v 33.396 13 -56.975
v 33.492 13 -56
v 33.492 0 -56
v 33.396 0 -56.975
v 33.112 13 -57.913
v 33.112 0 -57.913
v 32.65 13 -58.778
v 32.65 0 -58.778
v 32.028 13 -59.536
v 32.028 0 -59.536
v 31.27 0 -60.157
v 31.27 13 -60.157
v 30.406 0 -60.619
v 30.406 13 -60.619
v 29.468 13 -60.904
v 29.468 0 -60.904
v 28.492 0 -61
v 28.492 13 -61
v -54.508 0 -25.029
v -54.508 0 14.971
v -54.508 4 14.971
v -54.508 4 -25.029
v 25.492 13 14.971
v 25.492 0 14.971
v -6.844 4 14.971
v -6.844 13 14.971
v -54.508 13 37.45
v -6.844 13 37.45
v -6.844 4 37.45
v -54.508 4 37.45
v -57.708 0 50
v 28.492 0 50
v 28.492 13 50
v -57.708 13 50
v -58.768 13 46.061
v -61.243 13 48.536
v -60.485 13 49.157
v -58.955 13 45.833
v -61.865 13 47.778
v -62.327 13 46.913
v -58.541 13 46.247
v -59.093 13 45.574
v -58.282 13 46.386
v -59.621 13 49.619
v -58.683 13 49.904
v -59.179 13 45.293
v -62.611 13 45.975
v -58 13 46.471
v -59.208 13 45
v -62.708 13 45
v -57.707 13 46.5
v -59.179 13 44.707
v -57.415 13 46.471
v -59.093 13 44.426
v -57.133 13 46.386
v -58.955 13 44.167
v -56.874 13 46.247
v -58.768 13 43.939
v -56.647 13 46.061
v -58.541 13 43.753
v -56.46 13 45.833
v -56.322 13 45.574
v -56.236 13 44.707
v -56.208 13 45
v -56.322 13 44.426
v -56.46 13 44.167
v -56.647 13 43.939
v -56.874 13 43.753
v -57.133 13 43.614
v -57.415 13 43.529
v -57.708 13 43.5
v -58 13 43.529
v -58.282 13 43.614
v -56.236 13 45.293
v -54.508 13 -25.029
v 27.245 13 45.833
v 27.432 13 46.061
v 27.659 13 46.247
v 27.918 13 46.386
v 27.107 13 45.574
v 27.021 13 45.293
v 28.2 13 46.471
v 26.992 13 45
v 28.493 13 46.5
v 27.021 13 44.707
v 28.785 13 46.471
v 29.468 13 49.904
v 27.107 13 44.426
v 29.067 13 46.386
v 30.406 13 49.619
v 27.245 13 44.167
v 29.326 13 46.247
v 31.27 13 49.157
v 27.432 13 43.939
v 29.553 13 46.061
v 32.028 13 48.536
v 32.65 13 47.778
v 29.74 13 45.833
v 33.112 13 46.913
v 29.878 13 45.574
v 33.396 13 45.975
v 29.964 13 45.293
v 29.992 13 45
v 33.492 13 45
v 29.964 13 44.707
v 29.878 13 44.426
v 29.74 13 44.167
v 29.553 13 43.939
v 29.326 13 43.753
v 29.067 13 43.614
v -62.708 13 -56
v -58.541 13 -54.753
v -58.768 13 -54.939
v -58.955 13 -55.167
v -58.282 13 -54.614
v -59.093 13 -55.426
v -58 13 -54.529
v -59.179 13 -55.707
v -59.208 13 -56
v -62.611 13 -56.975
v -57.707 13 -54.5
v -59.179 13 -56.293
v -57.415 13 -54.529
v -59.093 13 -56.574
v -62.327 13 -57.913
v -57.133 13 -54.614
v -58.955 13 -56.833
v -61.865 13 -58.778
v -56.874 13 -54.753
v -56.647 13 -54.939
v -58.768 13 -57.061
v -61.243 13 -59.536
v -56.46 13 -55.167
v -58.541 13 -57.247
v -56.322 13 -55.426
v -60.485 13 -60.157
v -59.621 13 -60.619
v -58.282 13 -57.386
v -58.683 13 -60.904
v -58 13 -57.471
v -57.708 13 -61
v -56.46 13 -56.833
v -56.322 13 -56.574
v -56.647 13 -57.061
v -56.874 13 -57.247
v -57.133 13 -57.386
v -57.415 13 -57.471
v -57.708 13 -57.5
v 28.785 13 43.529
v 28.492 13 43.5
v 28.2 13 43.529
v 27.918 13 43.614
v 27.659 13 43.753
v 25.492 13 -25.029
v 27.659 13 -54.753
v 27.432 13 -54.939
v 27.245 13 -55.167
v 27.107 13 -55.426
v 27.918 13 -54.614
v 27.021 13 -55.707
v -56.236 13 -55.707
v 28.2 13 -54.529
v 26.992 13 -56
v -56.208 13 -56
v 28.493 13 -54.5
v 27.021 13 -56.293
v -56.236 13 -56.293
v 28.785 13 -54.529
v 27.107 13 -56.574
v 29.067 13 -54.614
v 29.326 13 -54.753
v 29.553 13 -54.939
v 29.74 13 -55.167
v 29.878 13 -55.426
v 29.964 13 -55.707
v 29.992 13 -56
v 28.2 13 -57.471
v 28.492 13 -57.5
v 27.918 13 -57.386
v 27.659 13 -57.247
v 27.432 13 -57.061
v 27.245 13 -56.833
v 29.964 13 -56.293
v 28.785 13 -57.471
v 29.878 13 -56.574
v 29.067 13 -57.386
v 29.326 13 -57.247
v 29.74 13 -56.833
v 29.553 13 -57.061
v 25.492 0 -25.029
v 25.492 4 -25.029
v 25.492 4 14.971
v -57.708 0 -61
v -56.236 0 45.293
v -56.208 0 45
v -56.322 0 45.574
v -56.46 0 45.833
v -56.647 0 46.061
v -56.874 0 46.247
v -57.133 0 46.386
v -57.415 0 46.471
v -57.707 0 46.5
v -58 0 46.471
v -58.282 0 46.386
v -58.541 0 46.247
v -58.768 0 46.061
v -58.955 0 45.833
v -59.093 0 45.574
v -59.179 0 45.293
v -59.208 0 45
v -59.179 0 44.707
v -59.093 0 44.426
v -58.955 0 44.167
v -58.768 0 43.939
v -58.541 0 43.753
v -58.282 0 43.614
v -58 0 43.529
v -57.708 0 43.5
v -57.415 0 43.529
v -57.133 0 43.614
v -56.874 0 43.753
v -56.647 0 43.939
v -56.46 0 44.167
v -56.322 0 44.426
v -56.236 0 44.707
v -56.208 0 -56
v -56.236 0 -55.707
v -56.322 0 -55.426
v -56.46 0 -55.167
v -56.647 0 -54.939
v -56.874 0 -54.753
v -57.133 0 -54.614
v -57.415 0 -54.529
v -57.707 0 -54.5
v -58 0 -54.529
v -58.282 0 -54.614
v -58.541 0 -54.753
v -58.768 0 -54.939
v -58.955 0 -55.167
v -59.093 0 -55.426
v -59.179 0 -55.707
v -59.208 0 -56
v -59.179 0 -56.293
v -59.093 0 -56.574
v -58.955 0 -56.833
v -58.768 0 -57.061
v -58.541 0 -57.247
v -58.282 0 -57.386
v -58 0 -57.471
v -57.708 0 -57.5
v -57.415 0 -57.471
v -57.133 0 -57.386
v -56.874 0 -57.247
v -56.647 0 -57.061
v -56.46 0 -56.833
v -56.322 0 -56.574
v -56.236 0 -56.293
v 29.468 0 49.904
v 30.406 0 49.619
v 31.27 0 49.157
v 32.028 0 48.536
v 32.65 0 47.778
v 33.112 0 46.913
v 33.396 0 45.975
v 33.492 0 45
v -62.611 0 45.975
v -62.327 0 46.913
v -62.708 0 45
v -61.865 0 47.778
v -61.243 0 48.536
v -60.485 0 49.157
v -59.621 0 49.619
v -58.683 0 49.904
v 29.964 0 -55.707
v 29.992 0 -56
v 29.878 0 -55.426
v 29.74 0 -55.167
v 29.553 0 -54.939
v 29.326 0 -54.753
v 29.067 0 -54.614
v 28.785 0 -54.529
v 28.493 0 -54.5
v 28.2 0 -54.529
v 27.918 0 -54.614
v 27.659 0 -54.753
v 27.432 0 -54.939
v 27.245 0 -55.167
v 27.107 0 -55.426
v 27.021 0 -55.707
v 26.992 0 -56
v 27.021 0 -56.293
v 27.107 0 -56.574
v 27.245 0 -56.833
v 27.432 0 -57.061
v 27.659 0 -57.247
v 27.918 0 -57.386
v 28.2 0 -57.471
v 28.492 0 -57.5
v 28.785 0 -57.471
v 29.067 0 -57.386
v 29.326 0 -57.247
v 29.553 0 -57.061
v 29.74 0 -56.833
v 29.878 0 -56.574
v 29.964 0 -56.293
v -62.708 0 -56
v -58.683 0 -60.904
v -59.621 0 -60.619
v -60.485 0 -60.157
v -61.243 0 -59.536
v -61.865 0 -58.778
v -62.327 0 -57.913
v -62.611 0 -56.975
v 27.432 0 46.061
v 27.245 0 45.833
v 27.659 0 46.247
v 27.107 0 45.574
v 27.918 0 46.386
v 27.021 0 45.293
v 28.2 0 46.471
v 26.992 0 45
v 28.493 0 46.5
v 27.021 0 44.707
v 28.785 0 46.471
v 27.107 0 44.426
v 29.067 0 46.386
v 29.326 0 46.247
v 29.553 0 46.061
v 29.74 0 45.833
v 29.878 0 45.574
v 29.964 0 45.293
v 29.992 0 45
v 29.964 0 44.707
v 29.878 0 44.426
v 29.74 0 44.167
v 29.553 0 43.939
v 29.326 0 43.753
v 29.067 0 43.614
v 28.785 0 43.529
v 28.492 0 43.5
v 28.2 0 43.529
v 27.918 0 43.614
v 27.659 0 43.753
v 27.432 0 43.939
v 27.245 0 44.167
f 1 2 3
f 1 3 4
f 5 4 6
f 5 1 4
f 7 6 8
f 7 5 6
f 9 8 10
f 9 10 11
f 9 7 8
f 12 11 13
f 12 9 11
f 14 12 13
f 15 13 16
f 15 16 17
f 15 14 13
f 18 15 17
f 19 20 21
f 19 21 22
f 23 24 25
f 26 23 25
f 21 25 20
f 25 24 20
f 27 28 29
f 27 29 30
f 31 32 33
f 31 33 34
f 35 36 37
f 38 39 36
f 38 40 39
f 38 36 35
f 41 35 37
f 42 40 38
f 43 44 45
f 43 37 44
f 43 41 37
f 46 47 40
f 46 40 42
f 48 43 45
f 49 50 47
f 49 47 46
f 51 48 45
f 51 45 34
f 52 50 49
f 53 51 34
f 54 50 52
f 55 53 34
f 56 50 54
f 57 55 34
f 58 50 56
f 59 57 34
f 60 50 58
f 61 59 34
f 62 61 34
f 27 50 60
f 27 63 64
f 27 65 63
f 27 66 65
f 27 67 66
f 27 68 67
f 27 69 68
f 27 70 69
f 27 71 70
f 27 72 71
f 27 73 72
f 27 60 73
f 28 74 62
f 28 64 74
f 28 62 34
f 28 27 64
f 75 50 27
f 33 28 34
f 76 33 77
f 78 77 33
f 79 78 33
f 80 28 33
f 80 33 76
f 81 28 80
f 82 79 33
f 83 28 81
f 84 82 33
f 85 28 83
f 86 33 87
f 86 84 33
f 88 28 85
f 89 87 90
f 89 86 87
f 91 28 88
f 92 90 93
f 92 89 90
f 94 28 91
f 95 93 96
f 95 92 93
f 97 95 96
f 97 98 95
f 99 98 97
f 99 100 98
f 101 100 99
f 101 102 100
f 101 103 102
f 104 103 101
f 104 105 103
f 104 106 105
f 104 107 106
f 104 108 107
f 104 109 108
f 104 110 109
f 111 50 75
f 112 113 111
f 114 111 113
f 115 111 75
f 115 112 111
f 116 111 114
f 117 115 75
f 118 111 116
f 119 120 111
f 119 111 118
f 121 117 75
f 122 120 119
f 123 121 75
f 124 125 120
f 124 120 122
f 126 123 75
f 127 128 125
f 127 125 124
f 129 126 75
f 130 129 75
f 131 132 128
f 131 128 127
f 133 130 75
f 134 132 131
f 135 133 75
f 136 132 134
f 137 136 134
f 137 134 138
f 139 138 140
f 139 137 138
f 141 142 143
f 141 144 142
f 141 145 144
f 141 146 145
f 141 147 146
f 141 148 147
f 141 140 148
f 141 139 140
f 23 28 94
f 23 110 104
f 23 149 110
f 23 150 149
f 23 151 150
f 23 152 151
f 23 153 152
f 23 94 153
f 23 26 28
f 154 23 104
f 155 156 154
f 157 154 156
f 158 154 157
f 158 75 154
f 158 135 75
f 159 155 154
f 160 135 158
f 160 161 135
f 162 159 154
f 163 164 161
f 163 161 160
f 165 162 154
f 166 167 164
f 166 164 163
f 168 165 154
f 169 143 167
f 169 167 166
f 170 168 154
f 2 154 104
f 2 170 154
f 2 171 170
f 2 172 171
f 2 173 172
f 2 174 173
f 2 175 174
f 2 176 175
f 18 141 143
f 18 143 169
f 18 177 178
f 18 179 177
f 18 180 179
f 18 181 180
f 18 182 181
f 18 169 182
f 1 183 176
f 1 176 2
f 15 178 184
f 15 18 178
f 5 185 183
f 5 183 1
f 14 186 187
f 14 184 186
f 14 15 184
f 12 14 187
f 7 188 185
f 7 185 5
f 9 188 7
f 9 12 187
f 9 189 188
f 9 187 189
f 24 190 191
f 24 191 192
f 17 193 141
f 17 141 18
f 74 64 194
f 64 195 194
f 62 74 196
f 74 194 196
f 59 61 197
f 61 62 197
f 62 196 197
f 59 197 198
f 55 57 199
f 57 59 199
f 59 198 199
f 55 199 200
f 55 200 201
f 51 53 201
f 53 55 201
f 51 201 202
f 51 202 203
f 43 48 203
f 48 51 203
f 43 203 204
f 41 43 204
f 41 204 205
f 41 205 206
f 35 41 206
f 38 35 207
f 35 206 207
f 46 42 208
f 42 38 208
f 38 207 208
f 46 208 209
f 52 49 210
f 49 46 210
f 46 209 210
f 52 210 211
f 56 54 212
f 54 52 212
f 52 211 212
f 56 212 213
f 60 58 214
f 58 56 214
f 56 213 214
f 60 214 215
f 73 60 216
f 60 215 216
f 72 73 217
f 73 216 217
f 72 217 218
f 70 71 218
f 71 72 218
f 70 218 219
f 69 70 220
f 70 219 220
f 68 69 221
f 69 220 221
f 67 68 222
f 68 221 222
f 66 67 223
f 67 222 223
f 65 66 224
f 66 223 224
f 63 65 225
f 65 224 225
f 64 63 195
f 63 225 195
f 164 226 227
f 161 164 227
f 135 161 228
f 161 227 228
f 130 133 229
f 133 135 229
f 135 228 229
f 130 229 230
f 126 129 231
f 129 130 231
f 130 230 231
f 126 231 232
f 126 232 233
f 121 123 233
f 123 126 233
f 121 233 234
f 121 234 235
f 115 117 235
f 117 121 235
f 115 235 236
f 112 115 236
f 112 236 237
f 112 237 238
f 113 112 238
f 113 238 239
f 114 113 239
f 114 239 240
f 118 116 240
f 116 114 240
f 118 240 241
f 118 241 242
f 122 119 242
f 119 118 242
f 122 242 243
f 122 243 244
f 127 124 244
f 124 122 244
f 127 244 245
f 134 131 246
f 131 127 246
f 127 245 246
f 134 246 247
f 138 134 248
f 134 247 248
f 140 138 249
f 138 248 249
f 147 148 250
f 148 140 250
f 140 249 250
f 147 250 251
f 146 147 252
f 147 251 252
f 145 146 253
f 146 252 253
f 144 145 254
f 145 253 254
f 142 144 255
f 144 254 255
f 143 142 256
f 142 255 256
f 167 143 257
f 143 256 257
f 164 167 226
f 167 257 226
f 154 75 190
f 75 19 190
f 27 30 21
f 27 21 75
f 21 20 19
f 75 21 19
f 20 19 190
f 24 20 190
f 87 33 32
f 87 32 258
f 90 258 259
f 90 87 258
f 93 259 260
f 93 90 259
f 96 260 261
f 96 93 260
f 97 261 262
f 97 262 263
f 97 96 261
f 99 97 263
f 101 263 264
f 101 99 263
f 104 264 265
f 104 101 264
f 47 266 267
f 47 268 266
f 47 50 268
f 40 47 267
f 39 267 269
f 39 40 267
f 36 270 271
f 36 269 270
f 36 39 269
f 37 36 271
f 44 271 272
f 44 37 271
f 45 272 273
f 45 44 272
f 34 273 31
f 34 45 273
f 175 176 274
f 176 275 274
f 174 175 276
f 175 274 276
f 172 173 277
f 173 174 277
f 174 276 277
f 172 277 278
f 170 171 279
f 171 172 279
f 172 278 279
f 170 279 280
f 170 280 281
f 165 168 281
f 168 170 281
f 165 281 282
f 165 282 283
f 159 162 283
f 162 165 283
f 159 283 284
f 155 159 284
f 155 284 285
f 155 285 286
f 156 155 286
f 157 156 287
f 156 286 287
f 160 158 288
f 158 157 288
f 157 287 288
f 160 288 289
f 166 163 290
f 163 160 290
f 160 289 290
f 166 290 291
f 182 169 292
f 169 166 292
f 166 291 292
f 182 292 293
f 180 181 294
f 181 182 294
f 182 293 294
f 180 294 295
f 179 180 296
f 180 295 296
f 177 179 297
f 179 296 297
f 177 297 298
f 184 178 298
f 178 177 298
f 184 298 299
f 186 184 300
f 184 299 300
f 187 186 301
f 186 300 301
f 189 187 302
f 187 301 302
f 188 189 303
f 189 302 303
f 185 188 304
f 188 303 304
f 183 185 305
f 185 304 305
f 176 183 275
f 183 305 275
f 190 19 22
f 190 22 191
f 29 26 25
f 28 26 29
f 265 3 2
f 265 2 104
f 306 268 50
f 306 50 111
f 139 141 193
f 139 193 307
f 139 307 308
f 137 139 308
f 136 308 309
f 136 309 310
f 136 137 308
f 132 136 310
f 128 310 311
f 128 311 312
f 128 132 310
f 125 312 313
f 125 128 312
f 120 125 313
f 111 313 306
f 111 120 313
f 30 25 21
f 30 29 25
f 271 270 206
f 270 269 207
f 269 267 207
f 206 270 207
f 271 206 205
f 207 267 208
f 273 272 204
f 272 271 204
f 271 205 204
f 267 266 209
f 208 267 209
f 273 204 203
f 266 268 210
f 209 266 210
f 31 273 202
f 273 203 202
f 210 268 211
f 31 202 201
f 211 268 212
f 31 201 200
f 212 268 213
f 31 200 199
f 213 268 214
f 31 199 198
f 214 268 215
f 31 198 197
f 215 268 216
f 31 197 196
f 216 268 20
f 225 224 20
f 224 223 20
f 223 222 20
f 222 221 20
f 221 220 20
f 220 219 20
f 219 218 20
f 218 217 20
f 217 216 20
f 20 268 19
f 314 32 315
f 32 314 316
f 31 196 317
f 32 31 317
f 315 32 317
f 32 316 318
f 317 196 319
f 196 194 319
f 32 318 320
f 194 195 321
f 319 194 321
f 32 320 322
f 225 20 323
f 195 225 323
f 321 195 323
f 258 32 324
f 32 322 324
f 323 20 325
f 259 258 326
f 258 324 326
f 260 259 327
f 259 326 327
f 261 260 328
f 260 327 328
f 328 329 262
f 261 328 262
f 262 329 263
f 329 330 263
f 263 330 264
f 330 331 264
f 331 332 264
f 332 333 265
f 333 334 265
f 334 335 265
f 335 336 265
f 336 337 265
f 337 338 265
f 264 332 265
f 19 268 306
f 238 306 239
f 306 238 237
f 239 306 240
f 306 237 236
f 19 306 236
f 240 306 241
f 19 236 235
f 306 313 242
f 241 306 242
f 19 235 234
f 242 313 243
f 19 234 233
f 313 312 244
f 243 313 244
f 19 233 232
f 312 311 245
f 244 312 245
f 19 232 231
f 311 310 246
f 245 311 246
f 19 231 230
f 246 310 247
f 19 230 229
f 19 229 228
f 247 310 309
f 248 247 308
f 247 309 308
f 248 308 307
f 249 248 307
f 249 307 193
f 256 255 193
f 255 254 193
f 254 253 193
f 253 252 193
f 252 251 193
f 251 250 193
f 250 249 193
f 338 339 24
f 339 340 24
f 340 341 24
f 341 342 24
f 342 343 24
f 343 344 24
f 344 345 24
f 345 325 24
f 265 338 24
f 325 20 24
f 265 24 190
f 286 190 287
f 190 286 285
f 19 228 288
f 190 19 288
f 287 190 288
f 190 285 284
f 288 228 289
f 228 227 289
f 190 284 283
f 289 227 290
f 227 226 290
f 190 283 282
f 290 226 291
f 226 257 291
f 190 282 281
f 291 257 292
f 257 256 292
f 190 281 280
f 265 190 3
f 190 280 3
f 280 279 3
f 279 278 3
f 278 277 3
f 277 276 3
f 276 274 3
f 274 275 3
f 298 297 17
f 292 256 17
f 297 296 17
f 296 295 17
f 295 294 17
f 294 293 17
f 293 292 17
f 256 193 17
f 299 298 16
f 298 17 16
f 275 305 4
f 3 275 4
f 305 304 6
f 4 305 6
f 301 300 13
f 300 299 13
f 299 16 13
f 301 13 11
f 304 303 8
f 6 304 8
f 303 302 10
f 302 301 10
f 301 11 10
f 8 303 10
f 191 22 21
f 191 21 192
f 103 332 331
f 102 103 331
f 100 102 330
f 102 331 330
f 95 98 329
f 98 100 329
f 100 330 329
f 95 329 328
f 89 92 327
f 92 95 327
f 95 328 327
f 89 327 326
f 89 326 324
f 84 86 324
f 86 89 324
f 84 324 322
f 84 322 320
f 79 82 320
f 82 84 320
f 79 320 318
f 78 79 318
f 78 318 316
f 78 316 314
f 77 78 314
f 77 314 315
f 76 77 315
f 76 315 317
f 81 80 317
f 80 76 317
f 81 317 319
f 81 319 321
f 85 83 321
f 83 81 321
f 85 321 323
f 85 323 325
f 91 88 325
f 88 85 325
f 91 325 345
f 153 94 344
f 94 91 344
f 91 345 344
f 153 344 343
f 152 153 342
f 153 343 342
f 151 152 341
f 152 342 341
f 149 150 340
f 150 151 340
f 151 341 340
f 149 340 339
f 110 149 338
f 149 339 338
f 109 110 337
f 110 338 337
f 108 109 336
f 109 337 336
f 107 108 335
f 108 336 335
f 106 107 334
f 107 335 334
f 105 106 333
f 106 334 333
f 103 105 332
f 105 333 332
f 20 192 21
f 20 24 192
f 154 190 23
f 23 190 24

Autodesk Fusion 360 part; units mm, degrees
sketch "Sketch1" plane through (0, 0, 0) normal (0, 1, 0) x (1, 0, 0)
  line L0 (33.4925, -50) -> (-62.7075, -50)
  line L1 (-62.7075, -50) -> (-62.7075, 61)
  line L2 (-62.7075, 61) -> (33.4925, 61)
  line L3 (33.4925, 61) -> (33.4925, -50)
  circle A0 centre (28.4925, -45) radius 1.5
  circle A1 centre (-57.7075, -45) radius 1.5
  circle A2 centre (-57.7075, 56) radius 1.5
  circle A3 centre (28.4925, 56) radius 1.5
  line L4 (25.4925, -14.9706) -> (-54.5075, -14.9706)
  line L5 (-54.5075, -14.9706) -> (-54.5075, 25.0294)
  line L6 (-54.5075, 25.0294) -> (25.4925, 25.0294)
  line L7 (25.4925, 25.0294) -> (25.4925, -14.9706)
  dimension "d1" = 96.2
  dimension "d2" = 111
  dimension "d3" = 3
  dimension "d4" = 5
  dimension "d5" = 5
  dimension "d6" = 3
  dimension "d7" = 5
  dimension "d8" = 5
  dimension "d9" = 3
  dimension "d10" = 5
  dimension "d11" = 5
  dimension "d12" = 3
  dimension "d13" = 5
  dimension "d14" = 5
  dimension "d15" = 40
  dimension "d16" = 80
  dimension "d21" = 8
  dimension "d22" = 35.0294
extrude "Extrude1" add sketch "Sketch1" along normal blind 13 makes body 1
extrude "Extrude2" add sketch "Sketch1" along normal blind 4 separate body contours L4 L5 L6 L7 makes body 2
sketch "Sketch4" plane through (0, 13, 0) normal (0, 1, 0) x (-1, 0, 0)
  circle A0 centre (57.7075, 45) radius 1.5
  circle A1 centre (57.7075, -56) radius 1.5
  circle A2 centre (-28.4925, -56) radius 1.5
  circle A3 centre (-28.4925, 45) radius 1.5
  line L0 (54.5075, -25.0294) -> (-25.4925, -25.0294)
  line L1 (-25.4925, -25.0294) -> (-25.4925, 14.9706)
  line L2 (-25.4925, 14.9706) -> (54.5075, 14.9706)
  line L3 (54.5075, 14.9706) -> (54.5075, -25.0294)
  line L4 (-33.4925, -61) -> (62.7075, -61)
  line L5 (62.7075, -61) -> (62.7075, 50)
  line L6 (62.7075, 50) -> (-33.4925, 50)
  line L7 (-33.4925, 50) -> (-33.4925, -61)
  line L8 (54.5075, 14.9706) -> (6.8436, 14.9706)
  line L9 (6.8436, 14.9706) -> (6.8436, 37.4505)
  line L10 (6.8436, 37.4505) -> (54.5075, 37.4505)
  line L11 (54.5075, 37.4505) -> (54.5075, 14.9706)
  dimension "d35" = 22.4799
  dimension "d36" = 47.6638
extrude "Extrude4" cut sketch "Sketch4" against normal blind 9 contours L2 L8 L9 L10 L11 bodies 1
fillet "Fillet1" radius 5 1 edges at (-62.7075, 6.5, 50) on bodies 1
fillet "Fillet2" radius 5 1 edges at (33.4925, 6.5, 50) on bodies 1
fillet "Fillet3" radius 5 1 edges at (33.4925, 6.5, -61) on bodies 1
fillet "Fillet4" radius 5 1 edges at (-62.7075, 6.5, -61) on bodies 1
